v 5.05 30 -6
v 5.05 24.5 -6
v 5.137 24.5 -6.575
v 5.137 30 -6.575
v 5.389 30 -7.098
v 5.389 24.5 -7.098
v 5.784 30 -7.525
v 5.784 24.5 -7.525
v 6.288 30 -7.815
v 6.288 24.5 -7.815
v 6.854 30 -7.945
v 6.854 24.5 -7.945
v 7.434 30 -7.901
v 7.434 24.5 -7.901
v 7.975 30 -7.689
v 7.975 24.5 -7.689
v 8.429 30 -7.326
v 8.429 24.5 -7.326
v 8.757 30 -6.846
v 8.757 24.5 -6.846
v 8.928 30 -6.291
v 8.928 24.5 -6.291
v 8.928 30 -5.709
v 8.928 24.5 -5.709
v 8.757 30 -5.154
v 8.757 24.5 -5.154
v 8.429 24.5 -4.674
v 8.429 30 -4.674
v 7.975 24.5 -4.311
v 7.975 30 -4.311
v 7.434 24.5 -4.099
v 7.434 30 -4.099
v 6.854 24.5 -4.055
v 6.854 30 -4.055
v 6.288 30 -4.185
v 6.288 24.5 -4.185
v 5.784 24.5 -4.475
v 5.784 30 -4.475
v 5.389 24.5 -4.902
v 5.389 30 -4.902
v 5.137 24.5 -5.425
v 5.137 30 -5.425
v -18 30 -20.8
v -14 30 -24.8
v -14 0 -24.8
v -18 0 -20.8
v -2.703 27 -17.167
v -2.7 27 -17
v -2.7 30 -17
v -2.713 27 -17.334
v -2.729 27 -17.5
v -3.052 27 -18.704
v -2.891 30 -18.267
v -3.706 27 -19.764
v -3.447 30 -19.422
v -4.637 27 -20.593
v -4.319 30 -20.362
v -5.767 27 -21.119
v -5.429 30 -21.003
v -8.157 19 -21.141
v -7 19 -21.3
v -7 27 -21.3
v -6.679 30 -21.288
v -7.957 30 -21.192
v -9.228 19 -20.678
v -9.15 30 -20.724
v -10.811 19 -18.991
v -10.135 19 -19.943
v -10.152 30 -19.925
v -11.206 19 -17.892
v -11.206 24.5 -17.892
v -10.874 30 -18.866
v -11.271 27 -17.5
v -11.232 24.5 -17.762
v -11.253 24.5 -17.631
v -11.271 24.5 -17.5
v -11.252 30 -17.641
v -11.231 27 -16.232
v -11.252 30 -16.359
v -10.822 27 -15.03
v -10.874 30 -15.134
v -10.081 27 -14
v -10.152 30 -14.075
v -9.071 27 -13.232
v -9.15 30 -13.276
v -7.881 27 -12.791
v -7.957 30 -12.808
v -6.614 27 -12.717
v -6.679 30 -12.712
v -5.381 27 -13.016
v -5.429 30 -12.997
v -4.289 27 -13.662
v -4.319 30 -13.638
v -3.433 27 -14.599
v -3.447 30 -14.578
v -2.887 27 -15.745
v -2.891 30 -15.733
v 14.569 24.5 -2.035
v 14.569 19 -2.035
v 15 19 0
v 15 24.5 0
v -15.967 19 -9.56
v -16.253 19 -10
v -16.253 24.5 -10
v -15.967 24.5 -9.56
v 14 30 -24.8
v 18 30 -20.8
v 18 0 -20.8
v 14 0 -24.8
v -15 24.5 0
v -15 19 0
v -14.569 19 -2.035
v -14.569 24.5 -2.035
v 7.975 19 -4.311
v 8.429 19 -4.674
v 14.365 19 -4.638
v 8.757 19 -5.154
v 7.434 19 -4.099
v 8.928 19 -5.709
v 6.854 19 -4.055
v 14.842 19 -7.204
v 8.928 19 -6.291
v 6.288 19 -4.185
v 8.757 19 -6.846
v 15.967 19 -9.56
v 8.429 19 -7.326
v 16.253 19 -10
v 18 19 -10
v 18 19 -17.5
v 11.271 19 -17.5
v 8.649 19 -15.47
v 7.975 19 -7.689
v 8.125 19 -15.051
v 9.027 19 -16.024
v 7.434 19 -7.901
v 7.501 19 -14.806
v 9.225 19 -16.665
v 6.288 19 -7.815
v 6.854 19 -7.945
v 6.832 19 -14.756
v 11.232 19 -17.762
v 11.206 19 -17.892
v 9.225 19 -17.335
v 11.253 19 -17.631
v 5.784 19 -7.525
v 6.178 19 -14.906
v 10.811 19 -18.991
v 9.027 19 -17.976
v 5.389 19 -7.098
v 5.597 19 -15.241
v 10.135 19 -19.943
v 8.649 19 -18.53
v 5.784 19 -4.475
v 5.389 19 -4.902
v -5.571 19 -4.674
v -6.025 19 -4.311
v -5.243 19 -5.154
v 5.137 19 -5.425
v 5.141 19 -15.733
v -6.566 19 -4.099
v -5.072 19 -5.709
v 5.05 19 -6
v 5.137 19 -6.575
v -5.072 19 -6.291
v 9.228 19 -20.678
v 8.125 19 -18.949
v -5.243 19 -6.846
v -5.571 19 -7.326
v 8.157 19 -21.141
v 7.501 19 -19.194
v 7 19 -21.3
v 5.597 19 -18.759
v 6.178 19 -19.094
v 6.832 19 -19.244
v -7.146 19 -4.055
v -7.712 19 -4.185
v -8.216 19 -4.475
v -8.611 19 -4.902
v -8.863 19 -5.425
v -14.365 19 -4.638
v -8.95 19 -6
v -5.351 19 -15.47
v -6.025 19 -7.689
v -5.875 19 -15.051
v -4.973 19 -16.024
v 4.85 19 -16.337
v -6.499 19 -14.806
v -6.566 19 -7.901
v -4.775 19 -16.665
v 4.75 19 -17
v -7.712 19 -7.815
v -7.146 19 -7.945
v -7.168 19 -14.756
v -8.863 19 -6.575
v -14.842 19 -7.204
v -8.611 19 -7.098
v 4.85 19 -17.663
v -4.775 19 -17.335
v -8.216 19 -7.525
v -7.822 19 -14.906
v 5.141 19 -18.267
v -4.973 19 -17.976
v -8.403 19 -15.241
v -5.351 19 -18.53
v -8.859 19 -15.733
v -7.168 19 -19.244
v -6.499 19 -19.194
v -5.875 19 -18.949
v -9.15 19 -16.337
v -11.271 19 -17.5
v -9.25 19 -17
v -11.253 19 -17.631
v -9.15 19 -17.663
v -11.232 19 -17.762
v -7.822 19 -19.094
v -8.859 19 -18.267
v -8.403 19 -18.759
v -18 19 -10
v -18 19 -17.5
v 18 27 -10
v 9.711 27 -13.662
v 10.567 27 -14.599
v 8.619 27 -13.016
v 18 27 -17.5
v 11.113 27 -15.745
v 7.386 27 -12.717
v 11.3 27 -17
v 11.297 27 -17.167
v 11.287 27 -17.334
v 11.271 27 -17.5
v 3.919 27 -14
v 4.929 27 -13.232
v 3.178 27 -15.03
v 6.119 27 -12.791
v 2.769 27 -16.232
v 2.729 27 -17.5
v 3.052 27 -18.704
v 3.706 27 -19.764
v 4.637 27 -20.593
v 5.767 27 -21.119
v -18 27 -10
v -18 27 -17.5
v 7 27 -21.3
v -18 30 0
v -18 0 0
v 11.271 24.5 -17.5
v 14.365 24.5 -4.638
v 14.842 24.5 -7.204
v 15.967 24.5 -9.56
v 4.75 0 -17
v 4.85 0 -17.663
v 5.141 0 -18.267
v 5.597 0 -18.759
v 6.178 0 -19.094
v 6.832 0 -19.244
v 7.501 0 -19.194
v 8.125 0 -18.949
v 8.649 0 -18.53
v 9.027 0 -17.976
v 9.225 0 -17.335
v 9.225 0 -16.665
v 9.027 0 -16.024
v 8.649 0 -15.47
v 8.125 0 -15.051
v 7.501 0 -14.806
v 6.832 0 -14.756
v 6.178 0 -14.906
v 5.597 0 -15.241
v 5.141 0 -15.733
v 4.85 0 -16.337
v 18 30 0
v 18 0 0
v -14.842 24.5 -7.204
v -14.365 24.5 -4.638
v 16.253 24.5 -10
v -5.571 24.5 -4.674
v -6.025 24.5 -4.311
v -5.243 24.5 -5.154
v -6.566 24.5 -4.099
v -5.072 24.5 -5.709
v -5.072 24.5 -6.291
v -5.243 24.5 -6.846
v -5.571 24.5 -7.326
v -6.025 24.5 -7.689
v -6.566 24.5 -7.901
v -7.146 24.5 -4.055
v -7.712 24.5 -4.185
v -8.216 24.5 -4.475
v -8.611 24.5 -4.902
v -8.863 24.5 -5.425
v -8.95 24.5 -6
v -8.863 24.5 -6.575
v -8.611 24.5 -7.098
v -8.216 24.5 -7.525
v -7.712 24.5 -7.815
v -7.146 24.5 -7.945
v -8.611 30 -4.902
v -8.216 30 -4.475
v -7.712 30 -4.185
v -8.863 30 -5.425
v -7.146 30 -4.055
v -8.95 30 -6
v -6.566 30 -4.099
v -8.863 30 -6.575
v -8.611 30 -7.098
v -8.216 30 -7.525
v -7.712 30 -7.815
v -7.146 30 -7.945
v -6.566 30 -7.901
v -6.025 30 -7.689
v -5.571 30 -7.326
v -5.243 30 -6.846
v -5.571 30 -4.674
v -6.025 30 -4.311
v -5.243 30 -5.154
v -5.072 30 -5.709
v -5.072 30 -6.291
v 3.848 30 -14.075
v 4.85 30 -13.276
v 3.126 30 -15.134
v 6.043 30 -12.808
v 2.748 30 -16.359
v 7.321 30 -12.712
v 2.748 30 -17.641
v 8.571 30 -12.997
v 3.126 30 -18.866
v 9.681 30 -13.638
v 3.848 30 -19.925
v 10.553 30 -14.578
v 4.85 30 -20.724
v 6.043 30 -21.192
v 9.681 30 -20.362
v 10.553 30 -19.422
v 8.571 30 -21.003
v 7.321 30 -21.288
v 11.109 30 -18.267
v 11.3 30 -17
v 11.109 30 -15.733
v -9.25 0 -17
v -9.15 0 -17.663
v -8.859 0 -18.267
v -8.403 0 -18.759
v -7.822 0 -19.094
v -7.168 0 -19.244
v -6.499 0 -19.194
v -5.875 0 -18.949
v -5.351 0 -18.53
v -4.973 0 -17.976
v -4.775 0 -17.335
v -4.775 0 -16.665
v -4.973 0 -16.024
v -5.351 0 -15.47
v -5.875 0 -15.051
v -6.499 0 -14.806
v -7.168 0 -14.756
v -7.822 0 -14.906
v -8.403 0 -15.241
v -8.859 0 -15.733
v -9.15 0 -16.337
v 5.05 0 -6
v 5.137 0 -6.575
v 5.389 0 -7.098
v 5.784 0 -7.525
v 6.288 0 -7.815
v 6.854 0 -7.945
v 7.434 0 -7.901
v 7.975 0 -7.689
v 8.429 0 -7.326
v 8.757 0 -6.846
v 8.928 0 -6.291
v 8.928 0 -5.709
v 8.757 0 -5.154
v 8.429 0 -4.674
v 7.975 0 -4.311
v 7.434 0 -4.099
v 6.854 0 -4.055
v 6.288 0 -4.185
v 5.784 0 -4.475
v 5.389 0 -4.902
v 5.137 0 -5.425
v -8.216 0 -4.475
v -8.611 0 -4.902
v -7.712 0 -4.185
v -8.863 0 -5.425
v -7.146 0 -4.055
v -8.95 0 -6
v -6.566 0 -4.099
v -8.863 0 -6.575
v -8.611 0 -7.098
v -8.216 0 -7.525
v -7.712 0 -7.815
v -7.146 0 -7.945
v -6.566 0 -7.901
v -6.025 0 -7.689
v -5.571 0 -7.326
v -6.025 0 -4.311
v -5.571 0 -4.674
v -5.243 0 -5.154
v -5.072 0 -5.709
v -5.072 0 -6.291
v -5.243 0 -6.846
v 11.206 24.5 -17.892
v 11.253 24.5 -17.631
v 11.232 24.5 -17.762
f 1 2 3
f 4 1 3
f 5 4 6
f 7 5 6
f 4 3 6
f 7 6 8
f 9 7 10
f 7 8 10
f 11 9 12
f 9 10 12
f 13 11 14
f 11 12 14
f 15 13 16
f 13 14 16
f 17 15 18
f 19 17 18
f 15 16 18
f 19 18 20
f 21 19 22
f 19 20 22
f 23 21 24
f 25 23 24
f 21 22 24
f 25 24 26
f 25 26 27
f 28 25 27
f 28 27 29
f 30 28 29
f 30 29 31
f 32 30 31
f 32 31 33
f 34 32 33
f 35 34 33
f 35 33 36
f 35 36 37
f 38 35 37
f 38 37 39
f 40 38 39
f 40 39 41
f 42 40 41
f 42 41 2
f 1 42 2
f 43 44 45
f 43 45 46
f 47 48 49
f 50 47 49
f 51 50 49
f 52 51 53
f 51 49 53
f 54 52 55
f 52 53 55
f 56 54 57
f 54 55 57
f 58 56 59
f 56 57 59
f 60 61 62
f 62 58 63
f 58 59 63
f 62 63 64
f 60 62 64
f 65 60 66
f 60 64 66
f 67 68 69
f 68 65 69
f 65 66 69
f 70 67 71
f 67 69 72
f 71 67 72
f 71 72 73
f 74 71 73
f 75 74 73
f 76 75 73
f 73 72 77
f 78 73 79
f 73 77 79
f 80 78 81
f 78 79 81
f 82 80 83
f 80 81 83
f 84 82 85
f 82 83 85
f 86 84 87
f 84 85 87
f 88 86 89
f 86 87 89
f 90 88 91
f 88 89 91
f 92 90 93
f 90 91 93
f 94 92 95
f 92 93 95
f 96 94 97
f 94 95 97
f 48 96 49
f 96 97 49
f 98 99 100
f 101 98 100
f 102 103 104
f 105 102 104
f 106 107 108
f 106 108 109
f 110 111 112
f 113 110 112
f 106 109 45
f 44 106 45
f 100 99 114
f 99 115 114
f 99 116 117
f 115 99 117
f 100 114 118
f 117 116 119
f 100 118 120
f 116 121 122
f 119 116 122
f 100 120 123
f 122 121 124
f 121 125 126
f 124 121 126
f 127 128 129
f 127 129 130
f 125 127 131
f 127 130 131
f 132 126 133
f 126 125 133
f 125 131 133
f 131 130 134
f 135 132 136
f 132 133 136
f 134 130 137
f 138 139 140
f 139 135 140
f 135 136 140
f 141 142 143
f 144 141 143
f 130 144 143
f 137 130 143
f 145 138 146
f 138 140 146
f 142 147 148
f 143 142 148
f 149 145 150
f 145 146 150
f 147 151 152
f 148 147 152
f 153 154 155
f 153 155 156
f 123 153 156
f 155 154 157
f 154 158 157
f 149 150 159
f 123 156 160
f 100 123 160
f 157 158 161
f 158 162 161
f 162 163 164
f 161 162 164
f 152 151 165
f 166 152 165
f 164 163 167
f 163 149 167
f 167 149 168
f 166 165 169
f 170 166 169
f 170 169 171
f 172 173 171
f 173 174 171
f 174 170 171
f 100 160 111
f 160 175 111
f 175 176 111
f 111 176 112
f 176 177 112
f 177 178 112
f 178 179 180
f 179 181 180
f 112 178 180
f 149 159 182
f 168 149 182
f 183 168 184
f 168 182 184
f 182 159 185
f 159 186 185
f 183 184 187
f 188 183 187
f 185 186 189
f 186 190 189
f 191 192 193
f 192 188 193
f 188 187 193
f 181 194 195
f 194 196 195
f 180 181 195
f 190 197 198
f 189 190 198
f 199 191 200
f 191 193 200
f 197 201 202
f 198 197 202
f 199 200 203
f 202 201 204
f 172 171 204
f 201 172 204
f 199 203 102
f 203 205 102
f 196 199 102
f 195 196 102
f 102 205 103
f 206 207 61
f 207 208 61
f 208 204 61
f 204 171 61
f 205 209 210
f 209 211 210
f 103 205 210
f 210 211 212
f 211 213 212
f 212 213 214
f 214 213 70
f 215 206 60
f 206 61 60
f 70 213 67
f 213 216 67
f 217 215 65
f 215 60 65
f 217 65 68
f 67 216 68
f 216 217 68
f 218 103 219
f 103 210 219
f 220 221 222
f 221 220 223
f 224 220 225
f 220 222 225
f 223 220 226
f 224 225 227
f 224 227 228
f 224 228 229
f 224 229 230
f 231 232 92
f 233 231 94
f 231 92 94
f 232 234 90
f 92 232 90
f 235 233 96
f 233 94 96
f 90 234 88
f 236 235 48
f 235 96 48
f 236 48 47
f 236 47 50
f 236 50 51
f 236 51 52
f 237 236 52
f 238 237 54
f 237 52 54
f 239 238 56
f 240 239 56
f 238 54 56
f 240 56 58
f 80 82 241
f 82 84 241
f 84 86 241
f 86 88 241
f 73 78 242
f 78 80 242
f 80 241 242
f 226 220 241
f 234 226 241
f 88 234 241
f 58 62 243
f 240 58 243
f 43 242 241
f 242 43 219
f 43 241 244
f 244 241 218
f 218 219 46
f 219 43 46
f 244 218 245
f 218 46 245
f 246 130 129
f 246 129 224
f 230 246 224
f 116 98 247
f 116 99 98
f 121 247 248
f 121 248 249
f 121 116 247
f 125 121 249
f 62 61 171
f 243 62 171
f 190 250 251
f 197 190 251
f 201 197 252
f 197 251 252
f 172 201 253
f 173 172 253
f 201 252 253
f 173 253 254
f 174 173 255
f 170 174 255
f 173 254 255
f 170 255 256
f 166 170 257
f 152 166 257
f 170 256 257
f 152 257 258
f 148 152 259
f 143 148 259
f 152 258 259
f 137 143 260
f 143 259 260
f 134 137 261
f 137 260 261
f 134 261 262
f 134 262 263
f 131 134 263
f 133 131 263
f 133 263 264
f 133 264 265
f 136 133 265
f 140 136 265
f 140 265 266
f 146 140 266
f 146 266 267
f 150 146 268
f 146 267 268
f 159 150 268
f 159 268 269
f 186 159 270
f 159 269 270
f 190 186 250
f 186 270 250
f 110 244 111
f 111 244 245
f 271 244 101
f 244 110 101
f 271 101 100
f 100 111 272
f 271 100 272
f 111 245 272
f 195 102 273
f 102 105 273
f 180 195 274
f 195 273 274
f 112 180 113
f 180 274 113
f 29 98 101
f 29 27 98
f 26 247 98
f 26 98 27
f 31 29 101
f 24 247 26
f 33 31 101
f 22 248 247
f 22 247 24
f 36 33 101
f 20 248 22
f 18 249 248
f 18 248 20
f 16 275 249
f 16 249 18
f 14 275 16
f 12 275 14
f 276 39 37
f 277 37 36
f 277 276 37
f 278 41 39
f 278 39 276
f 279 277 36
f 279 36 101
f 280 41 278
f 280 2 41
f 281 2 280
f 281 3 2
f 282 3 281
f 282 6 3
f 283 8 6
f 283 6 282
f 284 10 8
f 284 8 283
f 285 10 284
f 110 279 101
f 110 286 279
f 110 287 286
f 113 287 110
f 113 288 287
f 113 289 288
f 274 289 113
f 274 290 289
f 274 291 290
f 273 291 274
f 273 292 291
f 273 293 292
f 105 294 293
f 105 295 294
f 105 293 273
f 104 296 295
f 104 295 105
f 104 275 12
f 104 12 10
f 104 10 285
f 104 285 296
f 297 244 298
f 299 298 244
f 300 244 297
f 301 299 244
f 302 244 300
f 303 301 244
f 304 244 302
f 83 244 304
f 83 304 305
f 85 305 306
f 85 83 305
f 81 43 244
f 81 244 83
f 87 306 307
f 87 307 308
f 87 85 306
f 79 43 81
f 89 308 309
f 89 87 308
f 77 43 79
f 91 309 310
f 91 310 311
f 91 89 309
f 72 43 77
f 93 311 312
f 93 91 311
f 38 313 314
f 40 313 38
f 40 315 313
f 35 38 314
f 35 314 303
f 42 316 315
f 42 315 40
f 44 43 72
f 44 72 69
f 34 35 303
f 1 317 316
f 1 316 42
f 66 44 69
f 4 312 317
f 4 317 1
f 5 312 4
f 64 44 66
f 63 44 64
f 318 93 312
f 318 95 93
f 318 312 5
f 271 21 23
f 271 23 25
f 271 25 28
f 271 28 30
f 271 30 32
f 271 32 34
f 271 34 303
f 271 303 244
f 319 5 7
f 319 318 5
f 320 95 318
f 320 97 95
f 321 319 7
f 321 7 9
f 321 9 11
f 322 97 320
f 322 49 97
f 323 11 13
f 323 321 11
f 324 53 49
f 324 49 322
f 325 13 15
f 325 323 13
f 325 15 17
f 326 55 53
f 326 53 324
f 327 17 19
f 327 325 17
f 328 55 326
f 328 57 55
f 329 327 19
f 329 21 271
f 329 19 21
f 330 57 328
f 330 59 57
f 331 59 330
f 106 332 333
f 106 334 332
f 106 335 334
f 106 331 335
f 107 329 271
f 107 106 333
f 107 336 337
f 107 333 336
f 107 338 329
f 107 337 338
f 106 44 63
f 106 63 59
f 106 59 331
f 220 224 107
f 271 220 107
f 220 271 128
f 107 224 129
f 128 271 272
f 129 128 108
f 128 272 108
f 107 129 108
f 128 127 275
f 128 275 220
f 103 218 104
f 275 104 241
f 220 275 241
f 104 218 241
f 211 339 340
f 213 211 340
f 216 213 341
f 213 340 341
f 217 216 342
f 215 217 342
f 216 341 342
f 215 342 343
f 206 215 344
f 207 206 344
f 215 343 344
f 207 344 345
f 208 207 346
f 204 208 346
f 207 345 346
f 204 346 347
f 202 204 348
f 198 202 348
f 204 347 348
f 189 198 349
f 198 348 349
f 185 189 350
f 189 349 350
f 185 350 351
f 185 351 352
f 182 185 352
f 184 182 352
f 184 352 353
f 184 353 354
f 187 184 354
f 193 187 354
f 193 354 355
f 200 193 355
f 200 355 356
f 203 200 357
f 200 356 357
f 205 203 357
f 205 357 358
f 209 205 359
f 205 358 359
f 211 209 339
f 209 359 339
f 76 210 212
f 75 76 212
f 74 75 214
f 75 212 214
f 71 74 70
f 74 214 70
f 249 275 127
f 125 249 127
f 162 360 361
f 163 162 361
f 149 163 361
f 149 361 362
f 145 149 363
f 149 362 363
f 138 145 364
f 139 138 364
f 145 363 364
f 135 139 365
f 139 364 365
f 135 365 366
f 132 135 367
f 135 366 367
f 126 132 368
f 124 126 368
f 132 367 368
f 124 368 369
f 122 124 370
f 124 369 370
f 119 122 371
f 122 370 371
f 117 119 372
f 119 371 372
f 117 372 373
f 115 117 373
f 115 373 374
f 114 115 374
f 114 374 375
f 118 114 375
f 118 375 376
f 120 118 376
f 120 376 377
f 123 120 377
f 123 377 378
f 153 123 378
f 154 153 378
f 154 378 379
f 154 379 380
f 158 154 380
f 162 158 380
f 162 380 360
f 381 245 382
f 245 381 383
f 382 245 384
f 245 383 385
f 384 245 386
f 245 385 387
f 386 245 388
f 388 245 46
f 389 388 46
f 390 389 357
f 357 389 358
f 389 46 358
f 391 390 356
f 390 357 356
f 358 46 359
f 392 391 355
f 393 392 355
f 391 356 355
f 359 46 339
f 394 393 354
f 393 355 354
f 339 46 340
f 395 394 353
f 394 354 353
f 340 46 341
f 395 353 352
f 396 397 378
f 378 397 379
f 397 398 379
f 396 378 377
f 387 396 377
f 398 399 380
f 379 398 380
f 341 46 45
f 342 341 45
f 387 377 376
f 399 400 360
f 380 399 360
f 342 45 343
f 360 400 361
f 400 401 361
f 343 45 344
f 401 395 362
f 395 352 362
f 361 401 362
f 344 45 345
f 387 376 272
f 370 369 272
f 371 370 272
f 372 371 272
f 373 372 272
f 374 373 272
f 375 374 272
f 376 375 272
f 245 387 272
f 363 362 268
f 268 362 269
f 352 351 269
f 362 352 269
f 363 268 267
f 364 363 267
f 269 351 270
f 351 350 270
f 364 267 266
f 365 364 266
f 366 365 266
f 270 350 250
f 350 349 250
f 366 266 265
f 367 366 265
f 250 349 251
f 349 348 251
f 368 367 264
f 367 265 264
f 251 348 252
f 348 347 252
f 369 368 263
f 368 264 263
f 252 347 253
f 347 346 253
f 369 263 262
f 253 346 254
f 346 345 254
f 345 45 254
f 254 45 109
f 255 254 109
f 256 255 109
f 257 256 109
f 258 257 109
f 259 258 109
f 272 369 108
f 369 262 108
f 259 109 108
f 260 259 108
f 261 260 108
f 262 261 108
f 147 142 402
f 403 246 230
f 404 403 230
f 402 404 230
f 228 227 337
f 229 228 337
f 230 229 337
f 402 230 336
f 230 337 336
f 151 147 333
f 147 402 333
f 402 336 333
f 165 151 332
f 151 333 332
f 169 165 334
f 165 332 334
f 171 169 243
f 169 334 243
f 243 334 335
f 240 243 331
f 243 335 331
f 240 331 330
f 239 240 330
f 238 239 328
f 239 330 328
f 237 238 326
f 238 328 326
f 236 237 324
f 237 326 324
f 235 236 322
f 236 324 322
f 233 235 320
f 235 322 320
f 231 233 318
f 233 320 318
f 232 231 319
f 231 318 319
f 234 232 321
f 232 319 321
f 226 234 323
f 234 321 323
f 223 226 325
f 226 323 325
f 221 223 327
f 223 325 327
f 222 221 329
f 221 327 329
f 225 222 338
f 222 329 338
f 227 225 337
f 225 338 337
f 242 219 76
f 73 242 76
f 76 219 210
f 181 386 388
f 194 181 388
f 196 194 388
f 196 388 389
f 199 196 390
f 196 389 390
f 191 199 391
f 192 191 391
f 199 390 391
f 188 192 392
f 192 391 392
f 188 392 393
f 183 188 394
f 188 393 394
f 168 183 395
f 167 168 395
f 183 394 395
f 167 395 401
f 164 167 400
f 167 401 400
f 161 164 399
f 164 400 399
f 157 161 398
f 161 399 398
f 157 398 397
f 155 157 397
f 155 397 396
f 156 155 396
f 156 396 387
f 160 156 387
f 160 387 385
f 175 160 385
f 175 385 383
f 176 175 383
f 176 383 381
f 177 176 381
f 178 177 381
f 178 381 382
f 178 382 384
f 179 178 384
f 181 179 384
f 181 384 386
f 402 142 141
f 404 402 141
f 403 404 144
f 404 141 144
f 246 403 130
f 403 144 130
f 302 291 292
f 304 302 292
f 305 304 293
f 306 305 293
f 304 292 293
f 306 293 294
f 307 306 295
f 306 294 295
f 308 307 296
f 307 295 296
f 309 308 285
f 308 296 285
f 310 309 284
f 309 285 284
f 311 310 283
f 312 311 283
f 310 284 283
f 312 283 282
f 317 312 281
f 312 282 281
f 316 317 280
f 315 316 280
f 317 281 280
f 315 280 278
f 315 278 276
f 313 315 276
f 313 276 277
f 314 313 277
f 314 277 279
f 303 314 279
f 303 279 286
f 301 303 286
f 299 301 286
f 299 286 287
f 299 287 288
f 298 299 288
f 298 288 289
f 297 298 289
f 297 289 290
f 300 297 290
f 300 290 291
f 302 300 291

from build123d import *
from OCP.BRepFilletAPI import BRepFilletAPI_MakeChamfer

# Parameters (mm, degrees)
BOSS_EXTRUDE1_DEPTH             = 30
CUT_EXTRUDE2_DEPTH              = 5.5
CBORE_FOR_M4_SBHCS1_D           = 4.5
CBORE_FOR_M4_SBHCS1_CBORE_D     = 8.6
CBORE_FOR_M4_SBHCS1_CBORE_DEPTH = 8
F_3_9_3_9_DIAMETER_HOLE1_D      = 3.9
CUT_EXTRUDE3_DEPTH              = 43.884029661
CUT_EXTRUDE3_DEPTH_BACK         = 43.884029661
SKETCH9_W                       = 7.5
SKETCH9_H                       = 8
CHAMFER1_SIZE                   = 4
CHAMFER1_SIZE2                  = 3.37362922
DELETEFACE1_START               = 24.5
DELETEFACE1_DEPTH               = 2.5
DELETEFACE2_START               = 19
DELETEFACE2_DEPTH               = 5.5
FILLET1_R                       = 10


# Read off the part's stored shape, not the designer's step: DeleteFace1, DeleteFace2
with BuildPart() as part:
    # Sketch1 → Boss-Extrude1 (new body)
    with BuildSketch(Plane(origin=(0, 0, 0), x_dir=(1, 0, 0), z_dir=(0, 1, 0))):
        Polygon((-18, 0), (18, 0), (18, 20.8), (14, 24.8), (-14, 24.8), (-18, 20.8), align=None)
    extrude(amount=BOSS_EXTRUDE1_DEPTH)

    # Sketch7 → Cut-Extrude2 (cut)
    with BuildSketch(Plane(origin=(0, 19, 0), x_dir=(1, 0, 0), z_dir=(0, 1, 0))):
        with BuildLine():
            Line((-7, 21.3), (7, 21.3))
            ThreePointArc((7, 21.3), (9.706928791, 20.34103824), (11.206489583, 17.891877451))
            Line((11.206489583, 17.891877451), (15, 0))
            Line((15, 0), (-15, 0))
            Line((-15, 0), (-11.206489583, 17.891877451))
            ThreePointArc((-11.206489583, 17.891877451), (-9.706928791, 20.34103824), (-7, 21.3))
        make_face()
    extrude(amount=CUT_EXTRUDE2_DEPTH, mode=Mode.SUBTRACT)

    # CBORE for M4 SBHCS1 (through all)
    with Locations(Plane(origin=(0, 30, 0), x_dir=(1, 0, 0), z_dir=(0, 1, 0))):
        with Locations((-7, 17), (7, 17)):
            CounterBoreHole(CBORE_FOR_M4_SBHCS1_D / 2, CBORE_FOR_M4_SBHCS1_CBORE_D / 2, CBORE_FOR_M4_SBHCS1_CBORE_DEPTH)

    # Ø3.9 (3.9) Diameter Hole1 (through all)
    with Locations(Plane(origin=(0, 30, 0), x_dir=(1, 0, 0), z_dir=(0, 1, 0))):
        with Locations((-7, 6), (7, 6)):
            Hole(F_3_9_3_9_DIAMETER_HOLE1_D / 2)

    # Sketch9 → Cut-Extrude3 (cut, two sides: drawn at the far end of the back side and taken through both)
    with BuildSketch(Plane(origin=(0, 0, 0), x_dir=(0, 0, -1), z_dir=(1, 0, 0)).offset(-CUT_EXTRUDE3_DEPTH_BACK)):
        with Locations((13.75, 23)):
            Rectangle(SKETCH9_W, SKETCH9_H)
    extrude(amount=CUT_EXTRUDE3_DEPTH + CUT_EXTRUDE3_DEPTH_BACK, mode=Mode.SUBTRACT)

    # Chamfer1: one chamfer whose edges measure the first distance from different faces: ONE call of the kernel's chamfer builder (chamfer() names one face for all edges)
    chamfer1_edges_1 = [part.edges().sort_by_distance(p)[0] for p in [
        (-12.879758328, 21.75, -10),
    ]]
    chamfer1_side_1 = [part.faces().sort_by_distance(p)[0] for p in [
        (-13.939879164, 21.75, -5),
    ]]
    chamfer1_edges_2 = [part.edges().sort_by_distance(p)[0] for p in [
        (12.879758328, 21.75, -10),
    ]]
    chamfer1_side_2 = [part.faces().sort_by_distance(p)[0] for p in [
        (13.939879164, 21.75, -5),
    ]]
    chamfer1 = BRepFilletAPI_MakeChamfer(part.part.solid().wrapped)
    for e in chamfer1_edges_1:
        chamfer1.Add(CHAMFER1_SIZE, CHAMFER1_SIZE2, e.wrapped, chamfer1_side_1[0].wrapped)  # the first distance lies on this face
    for e in chamfer1_edges_2:
        chamfer1.Add(CHAMFER1_SIZE, CHAMFER1_SIZE2, e.wrapped, chamfer1_side_2[0].wrapped)  # the first distance lies on this face
    add(Compound.cast(chamfer1.Shape()), mode=Mode.REPLACE)

    # DeleteFace1 outline → DeleteFace1 (cut)
    with BuildSketch(Plane(origin=(0, 0, 0), x_dir=(1, 0, 0), z_dir=(0, 1, 0)).offset(DELETEFACE1_START)):
        with BuildLine():
            Line((7, 21.3), (-7, 21.3))
            ThreePointArc((-7, 21.3), (-4.141678814, 20.212475681), (-2.729168699, 17.5))
            Line((-2.729168699, 17.5), (2.729168699, 17.5))
            ThreePointArc((2.729168699, 17.5), (4.141678814, 20.212475681), (7, 21.3))
        make_face()
    extrude(amount=DELETEFACE1_DEPTH, mode=Mode.SUBTRACT)

    # DeleteFace2 outline → DeleteFace2 (add)
    with BuildSketch(Plane(origin=(0, 0, 0), x_dir=(1, 0, 0), z_dir=(0, 1, 0)).offset(DELETEFACE2_START)):
        with BuildLine():
            Line((-11.206489583, 17.891877451), (-11.289577073, 17.5))
            Line((-11.289577073, 17.5), (-11.270831301, 17.5))
            ThreePointArc((-11.270831301, 17.5), (-11.243186813, 17.696681903), (-11.206489583, 17.891877451))
        make_face()
        with BuildLine():
            Line((11.289577073, 17.5), (11.206489583, 17.891877451))
            ThreePointArc((11.206489583, 17.891877451), (11.243186813, 17.696681903), (11.270831301, 17.5))
            Line((11.270831301, 17.5), (11.289577073, 17.5))
        make_face()
    extrude(amount=DELETEFACE2_DEPTH)

    # Fillet1
    fillet1_edges = [part.edges().sort_by_distance(p)[0] for p in [
        (-13.70941177, 21.75, -6.086986434),
        (13.70941177, 21.75, -6.086986434),
    ]]
    fillet(fillet1_edges, radius=FILLET1_R)


solid = part.part
